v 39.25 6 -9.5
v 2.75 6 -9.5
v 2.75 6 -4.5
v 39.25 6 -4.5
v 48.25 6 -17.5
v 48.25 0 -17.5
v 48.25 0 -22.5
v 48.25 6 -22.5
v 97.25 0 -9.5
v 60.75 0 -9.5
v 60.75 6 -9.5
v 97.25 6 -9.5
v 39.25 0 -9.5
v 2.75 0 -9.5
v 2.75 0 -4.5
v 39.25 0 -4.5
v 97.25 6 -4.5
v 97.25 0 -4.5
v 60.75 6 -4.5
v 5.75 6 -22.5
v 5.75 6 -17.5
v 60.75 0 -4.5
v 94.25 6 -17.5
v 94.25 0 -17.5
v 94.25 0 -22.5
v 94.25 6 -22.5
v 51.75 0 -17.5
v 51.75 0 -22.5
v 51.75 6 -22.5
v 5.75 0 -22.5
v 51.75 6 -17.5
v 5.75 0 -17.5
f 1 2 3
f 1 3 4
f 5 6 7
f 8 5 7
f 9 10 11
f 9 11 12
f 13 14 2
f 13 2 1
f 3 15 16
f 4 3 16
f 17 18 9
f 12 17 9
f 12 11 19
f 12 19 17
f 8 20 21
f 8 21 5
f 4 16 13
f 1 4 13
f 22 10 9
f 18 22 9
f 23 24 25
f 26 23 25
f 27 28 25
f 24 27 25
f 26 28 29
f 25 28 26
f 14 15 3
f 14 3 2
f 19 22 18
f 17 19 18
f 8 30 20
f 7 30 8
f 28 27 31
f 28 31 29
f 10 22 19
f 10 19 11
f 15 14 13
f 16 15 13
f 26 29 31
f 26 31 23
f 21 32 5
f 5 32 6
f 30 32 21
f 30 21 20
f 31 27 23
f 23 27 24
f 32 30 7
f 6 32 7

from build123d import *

# Parameters (mm, degrees)
SKETCH1_W             = 36.5
SKETCH1_H             = 5
BOSS_EXTRUDE1_DEPTH   = 6
BOSS_EXTRUDE1_2_DEPTH = 6
SKETCH1_W_2           = 42.5
BOSS_EXTRUDE1_3_DEPTH = 6
BOSS_EXTRUDE1_4_DEPTH = 6


with BuildPart() as part:
    # Sketch1 → Boss-Extrude1 (new body)
    with BuildSketch(Plane(origin=(0, 0, 0), x_dir=(1, 0, 0), z_dir=(0, 1, 0))):
        with Locations((79, 7)):
            Rectangle(SKETCH1_W, SKETCH1_H)
    extrude(amount=BOSS_EXTRUDE1_DEPTH)


with BuildPart() as body_2:
    # Sketch1 → Boss-Extrude1 2 (new body)
    with BuildSketch(Plane(origin=(0, 0, 0), x_dir=(1, 0, 0), z_dir=(0, 1, 0))):
        with Locations((21, 7)):
            Rectangle(SKETCH1_W, SKETCH1_H)
    extrude(amount=BOSS_EXTRUDE1_2_DEPTH)


with BuildPart() as body_3:
    # Sketch1 → Boss-Extrude1 3 (new body)
    with BuildSketch(Plane(origin=(0, 0, 0), x_dir=(1, 0, 0), z_dir=(0, 1, 0))):
        with Locations((73, 20)):
            Rectangle(SKETCH1_W_2, SKETCH1_H)
    extrude(amount=BOSS_EXTRUDE1_3_DEPTH)


with BuildPart() as body_4:
    # Sketch1 → Boss-Extrude1 4 (new body)
    with BuildSketch(Plane(origin=(0, 0, 0), x_dir=(1, 0, 0), z_dir=(0, 1, 0))):
        with Locations((27, 20)):
            Rectangle(SKETCH1_W_2, SKETCH1_H)
    extrude(amount=BOSS_EXTRUDE1_4_DEPTH)


solid = Compound([part.part, body_2.part, body_3.part, body_4.part])
